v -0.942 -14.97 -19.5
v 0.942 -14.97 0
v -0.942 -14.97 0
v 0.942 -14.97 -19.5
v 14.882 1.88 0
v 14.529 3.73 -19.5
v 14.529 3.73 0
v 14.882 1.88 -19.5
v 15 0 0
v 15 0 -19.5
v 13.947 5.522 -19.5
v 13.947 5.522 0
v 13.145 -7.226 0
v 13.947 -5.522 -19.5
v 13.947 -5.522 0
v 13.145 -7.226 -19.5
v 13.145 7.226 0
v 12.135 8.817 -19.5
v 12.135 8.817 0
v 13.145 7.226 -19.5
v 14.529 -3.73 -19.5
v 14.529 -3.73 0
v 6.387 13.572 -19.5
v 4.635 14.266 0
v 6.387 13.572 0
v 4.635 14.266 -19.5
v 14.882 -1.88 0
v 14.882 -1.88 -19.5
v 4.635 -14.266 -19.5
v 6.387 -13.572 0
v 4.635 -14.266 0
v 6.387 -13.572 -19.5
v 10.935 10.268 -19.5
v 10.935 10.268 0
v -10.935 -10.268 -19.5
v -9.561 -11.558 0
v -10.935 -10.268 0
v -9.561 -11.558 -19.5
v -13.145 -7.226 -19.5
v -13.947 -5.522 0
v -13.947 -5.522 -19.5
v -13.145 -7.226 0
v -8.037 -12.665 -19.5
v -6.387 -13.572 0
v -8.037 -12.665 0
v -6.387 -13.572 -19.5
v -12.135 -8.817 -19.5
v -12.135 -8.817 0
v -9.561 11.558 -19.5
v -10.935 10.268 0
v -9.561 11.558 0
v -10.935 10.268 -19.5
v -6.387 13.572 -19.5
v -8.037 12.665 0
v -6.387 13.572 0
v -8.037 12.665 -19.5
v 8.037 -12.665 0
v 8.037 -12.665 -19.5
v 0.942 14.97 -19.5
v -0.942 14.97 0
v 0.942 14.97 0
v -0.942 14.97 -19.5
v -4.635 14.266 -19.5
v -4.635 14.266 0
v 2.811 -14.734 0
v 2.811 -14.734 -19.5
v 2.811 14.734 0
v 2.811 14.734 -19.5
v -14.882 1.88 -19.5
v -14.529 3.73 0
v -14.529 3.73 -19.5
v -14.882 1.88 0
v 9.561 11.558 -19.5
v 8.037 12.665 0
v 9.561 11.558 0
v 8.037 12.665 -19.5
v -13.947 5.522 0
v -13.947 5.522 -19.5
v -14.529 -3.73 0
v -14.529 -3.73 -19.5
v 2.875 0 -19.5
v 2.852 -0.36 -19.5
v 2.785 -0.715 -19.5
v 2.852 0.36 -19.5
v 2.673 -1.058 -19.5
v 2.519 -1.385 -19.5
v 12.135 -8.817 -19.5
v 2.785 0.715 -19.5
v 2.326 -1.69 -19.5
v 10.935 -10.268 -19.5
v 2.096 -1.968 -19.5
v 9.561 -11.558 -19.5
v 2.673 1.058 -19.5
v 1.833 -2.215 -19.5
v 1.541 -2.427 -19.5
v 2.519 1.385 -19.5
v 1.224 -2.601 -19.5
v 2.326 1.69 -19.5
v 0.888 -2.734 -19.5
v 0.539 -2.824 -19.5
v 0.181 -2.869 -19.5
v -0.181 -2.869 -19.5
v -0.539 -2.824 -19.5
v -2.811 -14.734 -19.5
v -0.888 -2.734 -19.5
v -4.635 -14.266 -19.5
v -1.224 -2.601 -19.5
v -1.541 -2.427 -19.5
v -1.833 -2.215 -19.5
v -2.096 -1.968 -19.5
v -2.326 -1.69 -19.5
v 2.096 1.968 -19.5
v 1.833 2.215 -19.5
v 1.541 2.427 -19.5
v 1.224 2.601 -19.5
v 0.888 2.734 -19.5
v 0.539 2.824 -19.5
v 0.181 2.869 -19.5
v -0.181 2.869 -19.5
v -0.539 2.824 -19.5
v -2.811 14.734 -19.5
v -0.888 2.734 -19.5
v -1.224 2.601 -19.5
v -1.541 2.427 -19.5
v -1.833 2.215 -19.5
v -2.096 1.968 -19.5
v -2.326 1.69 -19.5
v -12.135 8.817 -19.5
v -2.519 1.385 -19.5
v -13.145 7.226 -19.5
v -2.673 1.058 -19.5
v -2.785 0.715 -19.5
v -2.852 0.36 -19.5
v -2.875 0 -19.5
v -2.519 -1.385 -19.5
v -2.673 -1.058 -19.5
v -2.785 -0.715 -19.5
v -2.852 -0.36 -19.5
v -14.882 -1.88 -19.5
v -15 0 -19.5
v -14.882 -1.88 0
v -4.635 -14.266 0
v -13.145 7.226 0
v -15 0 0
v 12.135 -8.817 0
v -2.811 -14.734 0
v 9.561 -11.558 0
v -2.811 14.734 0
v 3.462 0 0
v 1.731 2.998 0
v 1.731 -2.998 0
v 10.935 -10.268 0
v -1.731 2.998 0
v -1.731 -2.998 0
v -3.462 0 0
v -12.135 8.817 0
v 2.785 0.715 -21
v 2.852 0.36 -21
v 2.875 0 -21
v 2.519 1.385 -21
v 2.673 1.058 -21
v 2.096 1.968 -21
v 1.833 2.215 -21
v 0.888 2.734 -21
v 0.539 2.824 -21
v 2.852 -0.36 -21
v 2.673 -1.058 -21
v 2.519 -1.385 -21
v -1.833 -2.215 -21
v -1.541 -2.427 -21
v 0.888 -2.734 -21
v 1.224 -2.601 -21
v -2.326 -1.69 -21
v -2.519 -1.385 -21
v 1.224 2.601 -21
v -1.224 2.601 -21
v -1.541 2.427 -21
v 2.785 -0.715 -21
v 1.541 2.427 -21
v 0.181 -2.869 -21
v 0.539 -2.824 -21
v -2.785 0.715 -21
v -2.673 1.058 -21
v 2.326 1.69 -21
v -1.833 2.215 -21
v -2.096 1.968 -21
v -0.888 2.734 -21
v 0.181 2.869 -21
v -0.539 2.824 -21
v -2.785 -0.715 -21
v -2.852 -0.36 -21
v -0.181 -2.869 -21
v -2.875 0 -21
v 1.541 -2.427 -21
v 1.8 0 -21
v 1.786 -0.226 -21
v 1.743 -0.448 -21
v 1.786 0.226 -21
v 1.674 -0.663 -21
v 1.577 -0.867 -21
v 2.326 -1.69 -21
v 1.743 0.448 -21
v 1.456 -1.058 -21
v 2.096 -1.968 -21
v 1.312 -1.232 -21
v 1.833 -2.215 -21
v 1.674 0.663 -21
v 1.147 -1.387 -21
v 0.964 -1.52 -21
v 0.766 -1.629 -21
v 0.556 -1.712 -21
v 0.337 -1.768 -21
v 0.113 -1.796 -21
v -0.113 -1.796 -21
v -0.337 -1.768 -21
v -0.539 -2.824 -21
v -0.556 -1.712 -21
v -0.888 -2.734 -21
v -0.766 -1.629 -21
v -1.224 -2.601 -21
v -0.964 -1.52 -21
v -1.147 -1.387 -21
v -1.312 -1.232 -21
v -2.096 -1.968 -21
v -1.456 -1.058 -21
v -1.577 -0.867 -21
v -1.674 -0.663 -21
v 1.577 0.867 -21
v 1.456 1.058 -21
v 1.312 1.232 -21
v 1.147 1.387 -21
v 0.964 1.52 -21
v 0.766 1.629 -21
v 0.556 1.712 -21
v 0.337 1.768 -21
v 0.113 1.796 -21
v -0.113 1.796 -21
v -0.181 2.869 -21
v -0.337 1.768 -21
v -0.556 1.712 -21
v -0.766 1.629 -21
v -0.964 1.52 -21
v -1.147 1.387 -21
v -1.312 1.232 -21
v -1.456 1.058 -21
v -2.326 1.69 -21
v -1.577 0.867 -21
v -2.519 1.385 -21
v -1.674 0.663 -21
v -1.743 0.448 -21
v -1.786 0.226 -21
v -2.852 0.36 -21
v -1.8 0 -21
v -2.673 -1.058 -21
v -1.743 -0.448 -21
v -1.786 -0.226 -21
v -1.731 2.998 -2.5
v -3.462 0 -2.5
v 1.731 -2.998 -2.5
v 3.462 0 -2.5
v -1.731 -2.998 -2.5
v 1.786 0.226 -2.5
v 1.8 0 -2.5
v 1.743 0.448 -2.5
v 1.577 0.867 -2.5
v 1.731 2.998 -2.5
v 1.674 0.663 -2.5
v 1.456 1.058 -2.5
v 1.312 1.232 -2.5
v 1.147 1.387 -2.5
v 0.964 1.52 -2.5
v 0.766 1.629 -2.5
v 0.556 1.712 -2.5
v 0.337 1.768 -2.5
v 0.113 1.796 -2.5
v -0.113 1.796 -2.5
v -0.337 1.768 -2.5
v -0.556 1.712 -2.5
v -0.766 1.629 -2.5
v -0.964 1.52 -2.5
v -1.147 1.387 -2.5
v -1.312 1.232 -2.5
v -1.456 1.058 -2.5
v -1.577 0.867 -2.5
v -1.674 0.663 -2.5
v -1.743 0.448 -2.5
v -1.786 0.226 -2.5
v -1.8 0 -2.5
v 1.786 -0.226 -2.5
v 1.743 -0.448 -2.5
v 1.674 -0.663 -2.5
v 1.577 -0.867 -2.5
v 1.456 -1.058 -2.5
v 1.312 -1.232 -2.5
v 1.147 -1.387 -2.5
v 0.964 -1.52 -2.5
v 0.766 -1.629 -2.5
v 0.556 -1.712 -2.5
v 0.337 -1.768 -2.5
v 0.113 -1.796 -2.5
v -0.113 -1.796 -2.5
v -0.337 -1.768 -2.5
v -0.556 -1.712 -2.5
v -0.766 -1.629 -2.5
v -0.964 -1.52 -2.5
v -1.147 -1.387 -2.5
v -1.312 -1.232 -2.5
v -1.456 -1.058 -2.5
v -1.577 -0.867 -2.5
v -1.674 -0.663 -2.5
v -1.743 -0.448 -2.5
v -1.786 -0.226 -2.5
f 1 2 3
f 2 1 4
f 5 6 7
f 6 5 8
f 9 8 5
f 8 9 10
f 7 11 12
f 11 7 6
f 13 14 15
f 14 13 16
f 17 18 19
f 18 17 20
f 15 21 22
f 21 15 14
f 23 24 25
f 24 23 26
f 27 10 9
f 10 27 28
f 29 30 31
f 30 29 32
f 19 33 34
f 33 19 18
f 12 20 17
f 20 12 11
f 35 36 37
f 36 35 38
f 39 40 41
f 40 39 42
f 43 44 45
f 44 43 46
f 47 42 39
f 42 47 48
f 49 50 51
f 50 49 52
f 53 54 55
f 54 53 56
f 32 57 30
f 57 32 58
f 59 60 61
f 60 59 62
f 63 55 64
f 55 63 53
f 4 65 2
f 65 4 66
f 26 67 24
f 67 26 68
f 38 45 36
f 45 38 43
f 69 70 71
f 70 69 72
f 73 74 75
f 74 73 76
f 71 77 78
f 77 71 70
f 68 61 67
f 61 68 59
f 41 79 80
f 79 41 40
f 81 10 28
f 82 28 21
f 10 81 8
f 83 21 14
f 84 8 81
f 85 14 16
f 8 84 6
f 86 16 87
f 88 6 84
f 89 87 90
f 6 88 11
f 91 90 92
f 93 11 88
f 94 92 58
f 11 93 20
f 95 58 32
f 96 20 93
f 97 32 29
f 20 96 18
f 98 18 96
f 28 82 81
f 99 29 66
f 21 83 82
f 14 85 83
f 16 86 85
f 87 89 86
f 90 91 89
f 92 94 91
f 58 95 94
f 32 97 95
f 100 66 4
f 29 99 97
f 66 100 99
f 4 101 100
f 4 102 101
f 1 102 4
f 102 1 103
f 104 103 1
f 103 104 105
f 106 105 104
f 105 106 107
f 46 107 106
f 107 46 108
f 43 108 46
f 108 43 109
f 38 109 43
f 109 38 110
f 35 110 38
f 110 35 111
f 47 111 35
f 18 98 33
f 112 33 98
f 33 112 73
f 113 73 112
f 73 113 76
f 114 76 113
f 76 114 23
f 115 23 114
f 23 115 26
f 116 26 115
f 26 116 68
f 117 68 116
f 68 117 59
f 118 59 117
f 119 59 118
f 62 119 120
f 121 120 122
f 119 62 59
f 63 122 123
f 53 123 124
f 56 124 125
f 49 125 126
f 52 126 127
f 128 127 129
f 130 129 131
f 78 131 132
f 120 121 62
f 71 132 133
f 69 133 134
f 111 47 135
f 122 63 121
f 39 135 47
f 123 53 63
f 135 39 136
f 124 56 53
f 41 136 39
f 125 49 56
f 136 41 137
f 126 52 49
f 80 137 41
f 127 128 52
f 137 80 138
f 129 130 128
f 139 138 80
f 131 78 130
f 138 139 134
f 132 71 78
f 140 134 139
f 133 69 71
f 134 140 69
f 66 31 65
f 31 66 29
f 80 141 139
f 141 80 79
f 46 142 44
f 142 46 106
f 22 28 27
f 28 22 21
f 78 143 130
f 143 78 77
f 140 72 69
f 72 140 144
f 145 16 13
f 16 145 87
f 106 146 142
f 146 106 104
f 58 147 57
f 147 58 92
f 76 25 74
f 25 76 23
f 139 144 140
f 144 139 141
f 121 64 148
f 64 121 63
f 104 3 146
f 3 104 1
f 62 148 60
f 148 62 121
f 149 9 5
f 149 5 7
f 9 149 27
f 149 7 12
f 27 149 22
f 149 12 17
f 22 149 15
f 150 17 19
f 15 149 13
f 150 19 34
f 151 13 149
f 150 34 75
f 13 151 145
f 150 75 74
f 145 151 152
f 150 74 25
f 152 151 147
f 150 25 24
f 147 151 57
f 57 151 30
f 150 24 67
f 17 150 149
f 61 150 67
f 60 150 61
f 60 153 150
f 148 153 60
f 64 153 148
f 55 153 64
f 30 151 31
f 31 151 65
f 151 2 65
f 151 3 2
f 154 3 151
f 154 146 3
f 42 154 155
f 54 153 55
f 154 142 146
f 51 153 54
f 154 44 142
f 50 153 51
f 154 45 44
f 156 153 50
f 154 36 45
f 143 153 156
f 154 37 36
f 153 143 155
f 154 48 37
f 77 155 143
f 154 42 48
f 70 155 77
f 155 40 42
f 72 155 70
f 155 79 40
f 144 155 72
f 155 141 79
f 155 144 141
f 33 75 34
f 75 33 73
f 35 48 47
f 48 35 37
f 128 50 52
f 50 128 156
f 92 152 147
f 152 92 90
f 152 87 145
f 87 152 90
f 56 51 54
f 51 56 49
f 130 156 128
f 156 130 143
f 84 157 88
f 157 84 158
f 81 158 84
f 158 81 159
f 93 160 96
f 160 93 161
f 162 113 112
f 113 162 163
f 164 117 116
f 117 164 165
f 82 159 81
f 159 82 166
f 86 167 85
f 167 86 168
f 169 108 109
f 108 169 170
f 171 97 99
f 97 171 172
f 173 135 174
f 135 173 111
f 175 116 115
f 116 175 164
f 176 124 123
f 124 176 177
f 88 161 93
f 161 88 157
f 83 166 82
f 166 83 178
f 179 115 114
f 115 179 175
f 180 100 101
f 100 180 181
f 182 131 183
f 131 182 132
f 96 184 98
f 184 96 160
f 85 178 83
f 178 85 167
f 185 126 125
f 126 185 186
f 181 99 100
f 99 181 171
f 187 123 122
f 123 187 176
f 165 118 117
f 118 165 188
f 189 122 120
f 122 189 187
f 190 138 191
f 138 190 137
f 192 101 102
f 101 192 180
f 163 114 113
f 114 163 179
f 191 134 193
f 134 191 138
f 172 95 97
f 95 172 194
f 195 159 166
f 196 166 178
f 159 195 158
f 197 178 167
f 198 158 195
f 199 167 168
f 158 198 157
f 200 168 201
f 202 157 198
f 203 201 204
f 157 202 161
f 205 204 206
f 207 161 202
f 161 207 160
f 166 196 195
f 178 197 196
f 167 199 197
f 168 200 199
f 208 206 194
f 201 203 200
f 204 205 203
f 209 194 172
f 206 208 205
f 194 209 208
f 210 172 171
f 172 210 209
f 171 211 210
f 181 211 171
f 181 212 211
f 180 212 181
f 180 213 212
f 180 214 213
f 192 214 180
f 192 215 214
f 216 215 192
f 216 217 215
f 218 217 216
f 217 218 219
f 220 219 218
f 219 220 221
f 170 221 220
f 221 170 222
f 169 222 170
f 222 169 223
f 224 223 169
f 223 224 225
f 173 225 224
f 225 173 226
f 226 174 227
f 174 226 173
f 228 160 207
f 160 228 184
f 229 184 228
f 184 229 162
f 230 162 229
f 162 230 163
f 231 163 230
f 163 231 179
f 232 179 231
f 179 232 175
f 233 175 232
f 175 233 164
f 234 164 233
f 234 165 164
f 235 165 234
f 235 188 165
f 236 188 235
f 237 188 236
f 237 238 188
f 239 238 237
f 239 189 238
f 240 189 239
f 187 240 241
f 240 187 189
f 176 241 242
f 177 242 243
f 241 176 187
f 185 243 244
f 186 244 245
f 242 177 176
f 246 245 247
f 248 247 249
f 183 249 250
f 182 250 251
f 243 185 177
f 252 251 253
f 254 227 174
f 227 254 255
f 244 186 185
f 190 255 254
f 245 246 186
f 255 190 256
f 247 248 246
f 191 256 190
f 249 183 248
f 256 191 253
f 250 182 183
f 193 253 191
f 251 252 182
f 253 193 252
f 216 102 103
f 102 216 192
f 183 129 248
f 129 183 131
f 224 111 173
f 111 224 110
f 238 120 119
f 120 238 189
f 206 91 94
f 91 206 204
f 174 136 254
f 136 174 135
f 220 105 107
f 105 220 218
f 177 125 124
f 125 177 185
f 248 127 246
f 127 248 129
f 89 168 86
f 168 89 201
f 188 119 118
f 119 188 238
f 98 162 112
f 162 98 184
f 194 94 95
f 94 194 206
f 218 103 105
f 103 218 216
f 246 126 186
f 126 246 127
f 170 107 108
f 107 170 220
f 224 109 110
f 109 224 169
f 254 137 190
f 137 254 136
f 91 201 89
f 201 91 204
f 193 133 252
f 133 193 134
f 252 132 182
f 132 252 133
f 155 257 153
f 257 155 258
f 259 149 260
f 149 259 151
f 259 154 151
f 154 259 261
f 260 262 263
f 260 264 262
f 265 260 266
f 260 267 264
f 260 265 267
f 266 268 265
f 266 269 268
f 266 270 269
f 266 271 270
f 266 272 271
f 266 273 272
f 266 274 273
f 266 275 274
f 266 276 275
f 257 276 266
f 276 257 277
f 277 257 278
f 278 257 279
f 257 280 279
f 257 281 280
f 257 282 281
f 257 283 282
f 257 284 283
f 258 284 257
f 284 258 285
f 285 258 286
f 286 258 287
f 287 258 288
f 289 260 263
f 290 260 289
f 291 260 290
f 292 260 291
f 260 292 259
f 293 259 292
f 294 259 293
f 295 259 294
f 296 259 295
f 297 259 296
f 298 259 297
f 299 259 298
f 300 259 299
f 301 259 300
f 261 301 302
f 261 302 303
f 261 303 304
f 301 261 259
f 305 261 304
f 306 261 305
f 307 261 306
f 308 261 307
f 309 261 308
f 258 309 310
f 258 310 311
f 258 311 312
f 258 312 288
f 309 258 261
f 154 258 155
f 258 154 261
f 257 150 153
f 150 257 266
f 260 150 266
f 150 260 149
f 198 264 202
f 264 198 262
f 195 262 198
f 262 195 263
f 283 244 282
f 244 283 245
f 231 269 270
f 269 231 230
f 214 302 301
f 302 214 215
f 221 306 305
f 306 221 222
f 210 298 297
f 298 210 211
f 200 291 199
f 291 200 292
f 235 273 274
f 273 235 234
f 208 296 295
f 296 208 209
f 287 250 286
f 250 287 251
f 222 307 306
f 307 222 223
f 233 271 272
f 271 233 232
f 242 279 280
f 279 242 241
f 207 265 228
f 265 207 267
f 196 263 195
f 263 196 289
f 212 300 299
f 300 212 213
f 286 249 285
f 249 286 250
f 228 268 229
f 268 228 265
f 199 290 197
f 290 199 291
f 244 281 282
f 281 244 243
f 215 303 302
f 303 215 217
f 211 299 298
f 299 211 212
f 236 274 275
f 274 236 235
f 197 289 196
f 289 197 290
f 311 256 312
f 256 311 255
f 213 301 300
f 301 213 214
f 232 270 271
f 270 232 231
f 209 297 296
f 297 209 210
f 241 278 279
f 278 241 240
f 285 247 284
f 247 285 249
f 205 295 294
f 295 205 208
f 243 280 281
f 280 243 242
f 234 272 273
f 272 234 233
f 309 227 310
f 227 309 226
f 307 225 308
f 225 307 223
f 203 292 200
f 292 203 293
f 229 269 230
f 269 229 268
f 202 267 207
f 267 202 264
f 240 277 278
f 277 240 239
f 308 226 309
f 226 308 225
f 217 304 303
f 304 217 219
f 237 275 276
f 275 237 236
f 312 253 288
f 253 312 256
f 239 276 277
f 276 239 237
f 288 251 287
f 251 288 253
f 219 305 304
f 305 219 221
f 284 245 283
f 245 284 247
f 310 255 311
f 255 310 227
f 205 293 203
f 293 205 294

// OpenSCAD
$fn = 50;


difference() {
	union() {
		translate(v = [0, 0, -19.5000000000]) {
			cylinder(h = 19.5000000000, r = 15.0000000000);
		}
		#translate(v = [0, 0, -21.0000000000]) {
			cylinder(h = 21, r = 2.8750000000);
		}
	}
	union() {
		translate(v = [0, 0, 0]) {
			rotate(a = [0, 0, 0]) {
				difference() {
					union() {
						translate(v = [0, 0, -2.5000000000]) {
							linear_extrude(height = 2.5000000000) {
								polygon(points = [[3.4620000000, 0.0000000000], [1.7310000000, 2.9981799479], [-1.7310000000, 2.9981799479], [-3.4620000000, 0.0000000000], [-1.7310000000, -2.9981799479], [1.7310000000, -2.9981799479]]);
							}
						}
					}
					union();
				}
			}
		}
		#translate(v = [0, 0, -100.0000000000]) {
			cylinder(h = 200, r = 1.8000000000);
		}
	}
}
